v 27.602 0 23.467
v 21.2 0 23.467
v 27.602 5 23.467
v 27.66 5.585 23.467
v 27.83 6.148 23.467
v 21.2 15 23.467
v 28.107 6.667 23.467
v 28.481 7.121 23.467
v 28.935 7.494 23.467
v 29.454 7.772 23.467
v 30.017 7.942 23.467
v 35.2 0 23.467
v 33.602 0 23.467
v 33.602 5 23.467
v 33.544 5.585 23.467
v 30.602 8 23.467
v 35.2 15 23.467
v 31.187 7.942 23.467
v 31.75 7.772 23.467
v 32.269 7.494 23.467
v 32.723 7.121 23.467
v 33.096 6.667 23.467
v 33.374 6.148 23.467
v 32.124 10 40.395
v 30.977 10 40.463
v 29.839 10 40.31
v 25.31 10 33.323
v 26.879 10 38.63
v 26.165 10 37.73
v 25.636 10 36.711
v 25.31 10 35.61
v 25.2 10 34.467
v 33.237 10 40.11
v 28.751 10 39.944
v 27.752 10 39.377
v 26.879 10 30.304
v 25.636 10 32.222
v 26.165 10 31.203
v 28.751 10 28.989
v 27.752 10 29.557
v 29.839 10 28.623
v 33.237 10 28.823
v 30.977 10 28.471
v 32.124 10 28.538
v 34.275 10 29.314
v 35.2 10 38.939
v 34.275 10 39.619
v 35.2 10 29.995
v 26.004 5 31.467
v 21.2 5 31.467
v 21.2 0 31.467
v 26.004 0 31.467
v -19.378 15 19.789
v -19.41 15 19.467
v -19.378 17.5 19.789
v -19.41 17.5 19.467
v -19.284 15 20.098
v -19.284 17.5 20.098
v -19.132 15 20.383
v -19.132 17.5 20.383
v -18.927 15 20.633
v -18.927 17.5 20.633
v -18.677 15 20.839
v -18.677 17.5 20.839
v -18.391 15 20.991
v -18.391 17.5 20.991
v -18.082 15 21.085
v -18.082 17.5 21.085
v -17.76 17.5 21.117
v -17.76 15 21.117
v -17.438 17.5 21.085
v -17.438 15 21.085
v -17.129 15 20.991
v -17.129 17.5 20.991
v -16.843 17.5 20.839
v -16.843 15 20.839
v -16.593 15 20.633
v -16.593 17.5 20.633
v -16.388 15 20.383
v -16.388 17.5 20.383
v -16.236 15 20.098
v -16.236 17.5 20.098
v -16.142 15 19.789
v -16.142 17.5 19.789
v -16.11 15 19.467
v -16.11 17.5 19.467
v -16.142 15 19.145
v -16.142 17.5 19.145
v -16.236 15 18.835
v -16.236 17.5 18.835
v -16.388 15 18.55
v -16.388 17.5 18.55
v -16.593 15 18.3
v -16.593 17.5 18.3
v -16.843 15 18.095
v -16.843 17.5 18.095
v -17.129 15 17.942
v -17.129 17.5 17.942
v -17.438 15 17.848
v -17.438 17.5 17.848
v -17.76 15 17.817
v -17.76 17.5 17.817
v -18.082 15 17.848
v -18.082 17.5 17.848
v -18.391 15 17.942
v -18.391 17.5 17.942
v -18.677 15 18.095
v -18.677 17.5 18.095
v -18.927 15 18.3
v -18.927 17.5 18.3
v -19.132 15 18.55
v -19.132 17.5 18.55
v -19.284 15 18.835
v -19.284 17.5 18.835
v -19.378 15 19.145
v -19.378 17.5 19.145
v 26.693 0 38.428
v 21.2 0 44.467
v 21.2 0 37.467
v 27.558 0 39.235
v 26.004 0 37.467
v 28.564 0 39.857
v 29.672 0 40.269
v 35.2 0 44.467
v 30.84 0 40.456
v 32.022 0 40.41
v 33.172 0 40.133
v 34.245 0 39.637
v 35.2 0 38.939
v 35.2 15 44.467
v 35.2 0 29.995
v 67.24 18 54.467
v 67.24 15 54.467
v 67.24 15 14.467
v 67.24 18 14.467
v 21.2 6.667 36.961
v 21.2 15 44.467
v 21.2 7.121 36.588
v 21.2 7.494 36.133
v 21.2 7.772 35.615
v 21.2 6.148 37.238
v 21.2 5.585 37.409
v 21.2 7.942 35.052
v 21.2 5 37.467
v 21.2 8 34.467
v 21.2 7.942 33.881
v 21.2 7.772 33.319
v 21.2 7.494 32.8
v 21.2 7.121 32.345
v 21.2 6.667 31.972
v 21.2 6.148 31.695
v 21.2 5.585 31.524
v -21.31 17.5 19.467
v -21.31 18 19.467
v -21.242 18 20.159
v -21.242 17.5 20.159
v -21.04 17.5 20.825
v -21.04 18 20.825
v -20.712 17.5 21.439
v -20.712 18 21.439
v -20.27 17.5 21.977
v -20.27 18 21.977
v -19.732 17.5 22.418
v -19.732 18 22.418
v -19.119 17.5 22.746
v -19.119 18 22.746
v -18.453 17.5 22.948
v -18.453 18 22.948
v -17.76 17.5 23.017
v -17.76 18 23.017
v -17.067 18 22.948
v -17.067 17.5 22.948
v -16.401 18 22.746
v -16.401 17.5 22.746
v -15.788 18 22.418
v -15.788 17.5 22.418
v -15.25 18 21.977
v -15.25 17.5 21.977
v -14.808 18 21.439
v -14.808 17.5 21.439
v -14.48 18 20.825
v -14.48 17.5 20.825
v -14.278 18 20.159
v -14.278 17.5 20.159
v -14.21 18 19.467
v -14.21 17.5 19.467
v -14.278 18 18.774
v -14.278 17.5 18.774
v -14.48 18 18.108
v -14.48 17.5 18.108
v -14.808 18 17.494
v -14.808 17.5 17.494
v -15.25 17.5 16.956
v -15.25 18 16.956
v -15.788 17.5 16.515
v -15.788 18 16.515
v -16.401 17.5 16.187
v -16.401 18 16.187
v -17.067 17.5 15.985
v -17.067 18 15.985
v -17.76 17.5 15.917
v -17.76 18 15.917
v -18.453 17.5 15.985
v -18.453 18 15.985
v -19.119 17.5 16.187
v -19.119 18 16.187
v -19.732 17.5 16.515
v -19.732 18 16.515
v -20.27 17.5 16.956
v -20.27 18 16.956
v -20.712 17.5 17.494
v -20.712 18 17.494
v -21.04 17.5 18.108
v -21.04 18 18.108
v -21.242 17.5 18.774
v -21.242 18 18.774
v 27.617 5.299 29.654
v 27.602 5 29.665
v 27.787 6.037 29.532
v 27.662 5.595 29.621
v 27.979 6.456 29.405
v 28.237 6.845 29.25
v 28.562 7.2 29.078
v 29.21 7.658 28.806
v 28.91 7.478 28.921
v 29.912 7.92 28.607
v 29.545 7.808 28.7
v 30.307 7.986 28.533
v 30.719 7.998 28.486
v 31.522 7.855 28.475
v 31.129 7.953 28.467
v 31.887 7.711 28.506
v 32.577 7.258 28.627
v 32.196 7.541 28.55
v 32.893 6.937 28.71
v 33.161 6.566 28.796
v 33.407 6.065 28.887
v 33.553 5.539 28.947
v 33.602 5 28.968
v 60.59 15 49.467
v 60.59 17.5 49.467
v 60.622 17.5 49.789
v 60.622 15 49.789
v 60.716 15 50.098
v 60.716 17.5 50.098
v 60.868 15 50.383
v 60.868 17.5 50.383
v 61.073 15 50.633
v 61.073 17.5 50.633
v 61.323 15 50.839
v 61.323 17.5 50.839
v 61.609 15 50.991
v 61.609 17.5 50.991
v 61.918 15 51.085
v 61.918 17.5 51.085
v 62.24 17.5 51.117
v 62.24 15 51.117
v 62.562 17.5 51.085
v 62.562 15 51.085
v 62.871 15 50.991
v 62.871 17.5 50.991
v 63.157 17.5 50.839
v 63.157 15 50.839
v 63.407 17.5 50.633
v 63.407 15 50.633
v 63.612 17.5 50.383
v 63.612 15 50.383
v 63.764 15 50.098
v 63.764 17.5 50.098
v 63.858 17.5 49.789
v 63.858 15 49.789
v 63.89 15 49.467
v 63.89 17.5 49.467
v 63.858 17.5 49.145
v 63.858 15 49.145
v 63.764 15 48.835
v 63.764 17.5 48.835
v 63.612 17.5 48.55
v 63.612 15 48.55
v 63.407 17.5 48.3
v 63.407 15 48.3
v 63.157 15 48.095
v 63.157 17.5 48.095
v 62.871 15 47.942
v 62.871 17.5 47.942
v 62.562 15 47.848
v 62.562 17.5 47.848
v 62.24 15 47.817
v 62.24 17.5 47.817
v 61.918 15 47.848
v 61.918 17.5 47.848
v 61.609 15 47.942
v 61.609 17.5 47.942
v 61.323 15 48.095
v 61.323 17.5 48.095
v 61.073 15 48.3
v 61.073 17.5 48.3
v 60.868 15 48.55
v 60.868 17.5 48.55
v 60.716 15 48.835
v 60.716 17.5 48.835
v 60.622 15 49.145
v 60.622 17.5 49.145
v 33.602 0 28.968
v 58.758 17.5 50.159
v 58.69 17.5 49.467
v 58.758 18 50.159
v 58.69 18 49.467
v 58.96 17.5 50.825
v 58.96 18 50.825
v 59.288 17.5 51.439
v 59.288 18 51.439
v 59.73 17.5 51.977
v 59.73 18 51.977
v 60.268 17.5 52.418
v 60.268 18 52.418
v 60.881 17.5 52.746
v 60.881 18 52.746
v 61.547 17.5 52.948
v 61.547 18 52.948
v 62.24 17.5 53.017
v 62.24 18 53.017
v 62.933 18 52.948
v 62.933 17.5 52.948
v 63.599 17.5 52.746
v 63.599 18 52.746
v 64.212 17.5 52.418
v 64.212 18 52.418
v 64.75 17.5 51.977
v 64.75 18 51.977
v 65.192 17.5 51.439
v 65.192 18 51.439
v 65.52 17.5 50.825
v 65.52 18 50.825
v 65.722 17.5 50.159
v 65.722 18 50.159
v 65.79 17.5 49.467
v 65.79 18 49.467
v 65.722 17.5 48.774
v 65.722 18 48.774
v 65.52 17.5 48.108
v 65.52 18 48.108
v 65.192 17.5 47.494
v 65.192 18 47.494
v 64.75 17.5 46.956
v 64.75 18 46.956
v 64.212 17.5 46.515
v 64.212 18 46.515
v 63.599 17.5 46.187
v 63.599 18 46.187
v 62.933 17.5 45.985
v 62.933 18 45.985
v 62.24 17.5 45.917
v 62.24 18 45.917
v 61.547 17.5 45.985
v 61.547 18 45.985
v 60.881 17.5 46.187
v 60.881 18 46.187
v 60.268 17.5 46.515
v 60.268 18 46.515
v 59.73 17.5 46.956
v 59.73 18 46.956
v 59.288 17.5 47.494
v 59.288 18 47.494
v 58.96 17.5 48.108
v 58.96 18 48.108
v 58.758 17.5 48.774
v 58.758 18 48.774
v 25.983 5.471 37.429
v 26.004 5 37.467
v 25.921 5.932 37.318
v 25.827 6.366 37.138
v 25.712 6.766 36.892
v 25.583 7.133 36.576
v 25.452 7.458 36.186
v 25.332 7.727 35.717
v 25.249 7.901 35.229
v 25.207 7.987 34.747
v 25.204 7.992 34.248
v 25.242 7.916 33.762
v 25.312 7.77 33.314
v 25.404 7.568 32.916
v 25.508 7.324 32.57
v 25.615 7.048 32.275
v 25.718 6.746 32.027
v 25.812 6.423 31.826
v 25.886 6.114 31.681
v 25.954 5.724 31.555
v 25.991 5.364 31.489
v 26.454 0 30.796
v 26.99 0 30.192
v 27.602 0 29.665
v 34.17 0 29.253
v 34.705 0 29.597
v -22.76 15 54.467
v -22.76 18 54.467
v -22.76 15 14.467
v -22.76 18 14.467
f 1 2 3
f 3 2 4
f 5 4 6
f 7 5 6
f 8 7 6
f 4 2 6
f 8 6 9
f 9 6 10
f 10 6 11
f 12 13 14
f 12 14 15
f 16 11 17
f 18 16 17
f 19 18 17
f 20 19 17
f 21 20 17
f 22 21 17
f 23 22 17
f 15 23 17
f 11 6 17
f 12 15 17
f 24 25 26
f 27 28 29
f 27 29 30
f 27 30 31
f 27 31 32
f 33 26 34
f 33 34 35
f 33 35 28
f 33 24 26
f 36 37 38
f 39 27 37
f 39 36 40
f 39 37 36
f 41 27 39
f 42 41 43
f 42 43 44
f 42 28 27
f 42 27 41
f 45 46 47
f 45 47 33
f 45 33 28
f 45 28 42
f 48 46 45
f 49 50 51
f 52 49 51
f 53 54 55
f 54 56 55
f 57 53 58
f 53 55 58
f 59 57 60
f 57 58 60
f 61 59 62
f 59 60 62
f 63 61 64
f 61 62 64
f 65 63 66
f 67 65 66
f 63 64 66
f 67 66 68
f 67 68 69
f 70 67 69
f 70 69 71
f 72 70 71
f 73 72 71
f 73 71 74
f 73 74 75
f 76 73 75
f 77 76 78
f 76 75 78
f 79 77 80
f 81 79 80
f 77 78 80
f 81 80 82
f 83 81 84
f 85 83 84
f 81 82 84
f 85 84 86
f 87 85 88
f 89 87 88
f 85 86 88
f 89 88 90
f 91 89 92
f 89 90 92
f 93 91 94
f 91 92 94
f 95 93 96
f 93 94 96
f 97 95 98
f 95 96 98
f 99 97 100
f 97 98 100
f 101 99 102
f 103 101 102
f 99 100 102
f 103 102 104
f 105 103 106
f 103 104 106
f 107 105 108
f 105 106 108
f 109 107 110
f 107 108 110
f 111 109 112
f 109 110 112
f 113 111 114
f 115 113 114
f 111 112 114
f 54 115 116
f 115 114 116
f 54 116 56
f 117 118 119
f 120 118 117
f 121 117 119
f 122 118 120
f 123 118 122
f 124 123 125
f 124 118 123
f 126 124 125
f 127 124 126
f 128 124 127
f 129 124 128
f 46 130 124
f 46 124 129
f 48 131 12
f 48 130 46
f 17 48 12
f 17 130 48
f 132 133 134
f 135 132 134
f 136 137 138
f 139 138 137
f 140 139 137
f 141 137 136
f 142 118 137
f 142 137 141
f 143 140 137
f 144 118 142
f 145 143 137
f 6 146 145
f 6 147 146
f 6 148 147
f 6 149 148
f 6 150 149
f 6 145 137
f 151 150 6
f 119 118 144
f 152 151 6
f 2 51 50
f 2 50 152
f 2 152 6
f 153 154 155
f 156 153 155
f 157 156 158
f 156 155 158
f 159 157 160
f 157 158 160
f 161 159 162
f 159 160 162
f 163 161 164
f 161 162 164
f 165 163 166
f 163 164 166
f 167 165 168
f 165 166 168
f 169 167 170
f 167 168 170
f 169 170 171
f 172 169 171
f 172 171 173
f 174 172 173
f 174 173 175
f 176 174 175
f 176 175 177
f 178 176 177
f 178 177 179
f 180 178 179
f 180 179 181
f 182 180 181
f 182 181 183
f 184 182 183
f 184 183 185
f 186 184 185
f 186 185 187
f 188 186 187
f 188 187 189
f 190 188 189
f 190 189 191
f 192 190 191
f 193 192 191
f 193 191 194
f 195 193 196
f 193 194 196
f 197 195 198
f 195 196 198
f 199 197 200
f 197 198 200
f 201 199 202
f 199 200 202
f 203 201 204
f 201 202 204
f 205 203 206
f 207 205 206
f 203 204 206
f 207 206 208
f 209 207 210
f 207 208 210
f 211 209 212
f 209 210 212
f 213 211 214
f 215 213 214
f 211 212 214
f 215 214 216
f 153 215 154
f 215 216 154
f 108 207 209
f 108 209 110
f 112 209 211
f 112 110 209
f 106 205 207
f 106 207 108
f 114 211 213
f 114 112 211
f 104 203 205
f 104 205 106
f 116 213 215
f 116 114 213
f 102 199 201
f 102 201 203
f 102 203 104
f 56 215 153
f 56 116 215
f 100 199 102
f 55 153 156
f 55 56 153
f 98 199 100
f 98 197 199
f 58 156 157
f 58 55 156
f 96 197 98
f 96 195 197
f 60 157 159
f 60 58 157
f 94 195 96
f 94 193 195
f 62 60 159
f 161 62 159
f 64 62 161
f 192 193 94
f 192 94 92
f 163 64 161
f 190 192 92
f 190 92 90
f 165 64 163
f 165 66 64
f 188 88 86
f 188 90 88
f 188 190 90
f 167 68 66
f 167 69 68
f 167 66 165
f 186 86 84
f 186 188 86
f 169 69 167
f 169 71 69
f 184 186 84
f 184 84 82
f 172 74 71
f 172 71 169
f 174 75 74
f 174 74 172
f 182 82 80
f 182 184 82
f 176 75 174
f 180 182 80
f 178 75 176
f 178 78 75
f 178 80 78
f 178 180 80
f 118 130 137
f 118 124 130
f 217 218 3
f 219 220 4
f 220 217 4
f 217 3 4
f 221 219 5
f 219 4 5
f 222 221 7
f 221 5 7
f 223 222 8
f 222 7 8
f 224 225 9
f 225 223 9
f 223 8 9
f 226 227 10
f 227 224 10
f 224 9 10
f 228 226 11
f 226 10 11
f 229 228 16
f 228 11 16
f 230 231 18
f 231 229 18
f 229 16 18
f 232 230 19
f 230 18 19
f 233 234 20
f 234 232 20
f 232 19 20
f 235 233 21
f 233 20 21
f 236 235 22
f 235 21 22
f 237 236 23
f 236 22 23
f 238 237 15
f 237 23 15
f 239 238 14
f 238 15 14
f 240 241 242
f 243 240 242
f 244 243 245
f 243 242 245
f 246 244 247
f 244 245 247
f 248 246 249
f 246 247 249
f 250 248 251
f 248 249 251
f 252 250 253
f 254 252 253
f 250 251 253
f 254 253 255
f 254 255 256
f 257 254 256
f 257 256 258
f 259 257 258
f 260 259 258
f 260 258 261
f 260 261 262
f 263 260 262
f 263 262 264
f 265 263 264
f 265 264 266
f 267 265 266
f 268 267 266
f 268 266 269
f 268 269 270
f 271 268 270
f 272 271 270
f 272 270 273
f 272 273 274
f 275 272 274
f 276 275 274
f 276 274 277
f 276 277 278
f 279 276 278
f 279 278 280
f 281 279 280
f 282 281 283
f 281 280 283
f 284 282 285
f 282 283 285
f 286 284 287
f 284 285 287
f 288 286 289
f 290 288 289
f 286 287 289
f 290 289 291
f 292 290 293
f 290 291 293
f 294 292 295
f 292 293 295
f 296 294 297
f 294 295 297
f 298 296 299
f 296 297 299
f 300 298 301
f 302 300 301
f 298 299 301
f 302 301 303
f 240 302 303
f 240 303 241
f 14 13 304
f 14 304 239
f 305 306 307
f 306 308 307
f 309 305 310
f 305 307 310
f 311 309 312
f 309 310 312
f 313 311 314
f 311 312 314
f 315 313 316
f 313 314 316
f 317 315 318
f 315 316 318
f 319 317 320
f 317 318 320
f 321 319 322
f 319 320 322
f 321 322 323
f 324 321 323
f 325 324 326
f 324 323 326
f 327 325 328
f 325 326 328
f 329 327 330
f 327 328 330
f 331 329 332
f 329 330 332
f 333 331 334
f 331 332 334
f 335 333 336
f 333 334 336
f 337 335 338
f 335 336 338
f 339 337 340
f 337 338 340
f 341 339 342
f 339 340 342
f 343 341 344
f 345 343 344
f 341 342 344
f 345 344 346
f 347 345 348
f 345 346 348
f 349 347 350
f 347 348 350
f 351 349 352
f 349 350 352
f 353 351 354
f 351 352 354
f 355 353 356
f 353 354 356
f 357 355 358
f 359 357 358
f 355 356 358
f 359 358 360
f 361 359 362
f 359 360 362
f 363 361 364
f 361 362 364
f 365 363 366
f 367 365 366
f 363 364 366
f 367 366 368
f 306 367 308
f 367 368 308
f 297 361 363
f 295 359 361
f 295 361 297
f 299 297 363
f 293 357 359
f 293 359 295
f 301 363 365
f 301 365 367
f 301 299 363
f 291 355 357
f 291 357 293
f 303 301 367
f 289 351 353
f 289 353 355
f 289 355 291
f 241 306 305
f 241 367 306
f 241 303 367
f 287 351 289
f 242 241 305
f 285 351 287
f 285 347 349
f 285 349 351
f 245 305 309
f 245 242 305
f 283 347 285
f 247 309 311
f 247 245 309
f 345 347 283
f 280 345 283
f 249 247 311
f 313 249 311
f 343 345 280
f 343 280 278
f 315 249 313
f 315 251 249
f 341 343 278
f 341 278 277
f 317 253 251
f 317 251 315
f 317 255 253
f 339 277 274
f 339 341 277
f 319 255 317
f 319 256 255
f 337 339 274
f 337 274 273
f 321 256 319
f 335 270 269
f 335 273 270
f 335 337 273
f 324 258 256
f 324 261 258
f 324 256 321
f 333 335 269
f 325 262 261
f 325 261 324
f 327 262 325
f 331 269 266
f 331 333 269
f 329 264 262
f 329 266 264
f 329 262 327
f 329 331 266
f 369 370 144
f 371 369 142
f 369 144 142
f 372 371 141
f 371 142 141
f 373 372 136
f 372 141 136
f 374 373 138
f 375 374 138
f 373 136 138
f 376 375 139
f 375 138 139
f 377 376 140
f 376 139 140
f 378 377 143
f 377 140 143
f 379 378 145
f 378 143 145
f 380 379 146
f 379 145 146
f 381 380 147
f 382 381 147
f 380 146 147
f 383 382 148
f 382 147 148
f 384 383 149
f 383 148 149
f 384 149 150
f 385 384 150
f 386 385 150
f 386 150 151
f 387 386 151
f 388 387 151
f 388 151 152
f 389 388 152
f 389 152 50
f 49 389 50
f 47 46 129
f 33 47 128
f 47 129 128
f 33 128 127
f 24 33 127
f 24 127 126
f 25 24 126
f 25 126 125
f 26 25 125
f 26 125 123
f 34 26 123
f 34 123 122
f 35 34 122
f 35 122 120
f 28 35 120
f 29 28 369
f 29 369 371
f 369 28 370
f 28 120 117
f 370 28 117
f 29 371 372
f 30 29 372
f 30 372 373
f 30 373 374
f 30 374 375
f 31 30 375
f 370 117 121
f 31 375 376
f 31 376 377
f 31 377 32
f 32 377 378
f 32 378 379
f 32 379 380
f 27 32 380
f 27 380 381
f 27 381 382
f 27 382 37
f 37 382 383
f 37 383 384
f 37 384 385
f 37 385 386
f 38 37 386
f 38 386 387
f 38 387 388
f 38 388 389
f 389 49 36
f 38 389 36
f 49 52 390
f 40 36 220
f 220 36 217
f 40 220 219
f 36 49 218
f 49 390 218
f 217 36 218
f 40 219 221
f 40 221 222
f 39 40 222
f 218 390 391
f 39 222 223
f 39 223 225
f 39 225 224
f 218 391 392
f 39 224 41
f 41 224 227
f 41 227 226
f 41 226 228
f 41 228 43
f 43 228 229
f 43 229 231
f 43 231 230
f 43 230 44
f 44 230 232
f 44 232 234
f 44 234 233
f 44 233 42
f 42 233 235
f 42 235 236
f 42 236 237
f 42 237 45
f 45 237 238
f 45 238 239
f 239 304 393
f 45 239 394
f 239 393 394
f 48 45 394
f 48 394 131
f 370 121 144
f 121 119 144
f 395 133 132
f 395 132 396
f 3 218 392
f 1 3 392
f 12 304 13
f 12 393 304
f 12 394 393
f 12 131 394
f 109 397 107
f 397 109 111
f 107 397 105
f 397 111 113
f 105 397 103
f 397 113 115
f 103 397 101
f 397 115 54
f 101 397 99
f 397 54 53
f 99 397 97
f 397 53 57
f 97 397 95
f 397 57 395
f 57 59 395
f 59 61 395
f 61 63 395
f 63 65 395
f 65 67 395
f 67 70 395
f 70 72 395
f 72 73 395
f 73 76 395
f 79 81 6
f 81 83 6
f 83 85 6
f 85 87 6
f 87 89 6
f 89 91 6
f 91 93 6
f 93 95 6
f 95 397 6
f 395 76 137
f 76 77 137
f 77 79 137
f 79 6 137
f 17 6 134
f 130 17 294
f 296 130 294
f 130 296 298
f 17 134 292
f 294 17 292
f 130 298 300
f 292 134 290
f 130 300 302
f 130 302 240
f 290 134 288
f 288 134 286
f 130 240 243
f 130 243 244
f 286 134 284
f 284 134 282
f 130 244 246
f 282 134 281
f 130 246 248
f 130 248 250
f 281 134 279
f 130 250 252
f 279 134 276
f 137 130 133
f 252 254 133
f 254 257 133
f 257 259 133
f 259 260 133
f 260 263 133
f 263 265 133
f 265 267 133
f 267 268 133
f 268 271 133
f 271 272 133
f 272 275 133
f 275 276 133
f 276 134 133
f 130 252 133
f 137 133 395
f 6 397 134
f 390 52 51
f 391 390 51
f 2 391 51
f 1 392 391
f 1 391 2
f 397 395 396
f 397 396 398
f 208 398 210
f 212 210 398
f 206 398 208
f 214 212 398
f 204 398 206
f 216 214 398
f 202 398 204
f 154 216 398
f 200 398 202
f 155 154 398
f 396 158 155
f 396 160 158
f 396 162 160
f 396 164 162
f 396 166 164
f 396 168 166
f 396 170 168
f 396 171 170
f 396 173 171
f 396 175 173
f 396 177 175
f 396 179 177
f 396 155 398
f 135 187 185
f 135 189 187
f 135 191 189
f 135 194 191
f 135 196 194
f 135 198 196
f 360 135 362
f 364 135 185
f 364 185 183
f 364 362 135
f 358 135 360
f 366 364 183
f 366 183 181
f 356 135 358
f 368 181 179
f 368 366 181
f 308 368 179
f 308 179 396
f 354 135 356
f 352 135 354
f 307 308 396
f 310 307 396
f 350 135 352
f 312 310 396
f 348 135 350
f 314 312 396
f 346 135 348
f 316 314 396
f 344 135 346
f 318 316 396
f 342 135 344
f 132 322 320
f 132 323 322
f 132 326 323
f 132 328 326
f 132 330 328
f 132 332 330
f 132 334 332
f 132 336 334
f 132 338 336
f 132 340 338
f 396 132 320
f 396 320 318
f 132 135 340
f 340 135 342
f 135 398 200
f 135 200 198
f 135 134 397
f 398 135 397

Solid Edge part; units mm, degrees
sketch "Sketch1" plane through (0, 0, 0) normal (0, -1, 0) x (1, 0, 0)
  line L0 (21.2, 4.4667) -> (41.2, 4.4667)
  line L1 (41.2, 4.4667) -> (41.2, 44.4667)
  line L2 (41.2, 44.4667) -> (21.2, 44.4667)
  line L3 (21.2, 44.4667) -> (21.2, 4.4667)
  dimension "D1" = 20
  dimension "D2" = 40
extrude "Protrusion1" add sketch "Sketch1" against normal blind 15
sketch "Sketch2" plane through (31.2, 0, 24.4667) normal (0, -1, 0) x (1, 0, 0)
  circle A0 centre (0, 10) radius 6
  dimension "D1" = 12
  dimension "D2" = 10
extrude "ExtrudedCutout_1" cut sketch "Sketch2" against normal blind 10
sketch "Sketch3" plane through (21.2, 7.5, 24.4667) normal (-1, 0, 0) x (0, -1, 0)
  line L0 (7.5, 13) -> (2.5, 13)
  arc A0 (2.5, 13) -> (2.5, 7) centre (2.5, 10) ccw
  line L1 (2.5, 7) -> (7.5, 7)
  line L2 (7.5, 13) -> (7.5, 7)
  dimension "D1" = 7
  dimension "D2" = 3
  dimension "D3" = 5
extrude "Cutout1" cut sketch "Sketch3" against normal through all
sketch "Sketch4" plane through (31.2, 15, 24.4667) normal (0, 1, 0) x (-1, 0, 0)
  line L0 (-10, 20) -> (-4, 20)
  line L1 (-4, 20) -> (-4, -20)
  line L2 (-4, -20) -> (-10, -20)
  line L3 (-10, -20) -> (-10, 20)
  dimension "D1" = 6
extrude "Cutout2" cut sketch "Sketch4" against normal through all
sketch "Sketch5" plane through (28.2, 7.5, 4.4667) normal (0, 0, -1) x (1, 0, 0)
  line L0 (5.4019, 7.5) -> (5.4019, 2.5)
  arc A0 (5.4019, 2.5) -> (-0.5981, 2.5) centre (2.4019, 2.5) cw
  line L1 (-0.5981, 2.5) -> (-0.5981, 7.5)
  line L2 (5.4019, 7.5) -> (-0.5981, 7.5)
  dimension "D1" = 3
  dimension "D2" = 3
  dimension "D3" = 5
  dimension "D4" = 5
  dimension "D5" = 3
extrude "Cutout3" cut sketch "Sketch5" against normal up to next
sketch "Sketch6" plane through (28.2, 15, 24.4667) normal (0, 1, 0) x (-1, 0, 0)
  line L0 (-7, -20) -> (7, -20)
  line L1 (7, -20) -> (7, -1)
  line L2 (7, -1) -> (-7, -1)
  line L3 (-7, -1) -> (-7, -20)
  dimension "D1" = 19
extrude "Cutout4" cut sketch "Sketch6" against normal up to next
sketch "Sketch7" plane through (28.2, 15, 33.9667) normal (0, 1, 0) x (-1, 0, 0)
  line L0 (-39.04, 20.5) -> (-39.04, -19.5)
  line L1 (-39.04, -19.5) -> (50.96, -19.5)
  line L2 (50.96, 20.5) -> (50.96, -19.5)
  line L3 (-39.04, 20.5) -> (50.96, 20.5)
  dimension "D1" = 40
  dimension "D2" = 36.04
  dimension "D3" = 90
  dimension "D4" = 40
extrude "ExtrudedProtrusion_2" add sketch "Sketch7" along normal blind 3
sketch "Sketch8" plane through (19.24, 18, 34.4667) normal (0, 1, 0) x (-1, 0, 0)
  circle A0 centre (-43, 15) radius 1.65
  circle A1 centre (37, -15) radius 1.65
  dimension "D1" = 3.3
  dimension "D2" = 5
  dimension "D3" = 5
  dimension "D4" = 3.3
  dimension "D5" = 5
  dimension "D6" = 5
extrude "Cutout5" cut sketch "Sketch8" against normal through all
sketch "Sketch9" plane through (19.24, 18, 34.4667) normal (0, 1, 0) x (-1, 0, 0)
  circle A0 centre (-43, 15) radius 3.55
  circle A1 centre (37, -15) radius 3.55
extrude "ExtrudedCutout_9" cut sketch "Sketch9" against normal blind 0.5
